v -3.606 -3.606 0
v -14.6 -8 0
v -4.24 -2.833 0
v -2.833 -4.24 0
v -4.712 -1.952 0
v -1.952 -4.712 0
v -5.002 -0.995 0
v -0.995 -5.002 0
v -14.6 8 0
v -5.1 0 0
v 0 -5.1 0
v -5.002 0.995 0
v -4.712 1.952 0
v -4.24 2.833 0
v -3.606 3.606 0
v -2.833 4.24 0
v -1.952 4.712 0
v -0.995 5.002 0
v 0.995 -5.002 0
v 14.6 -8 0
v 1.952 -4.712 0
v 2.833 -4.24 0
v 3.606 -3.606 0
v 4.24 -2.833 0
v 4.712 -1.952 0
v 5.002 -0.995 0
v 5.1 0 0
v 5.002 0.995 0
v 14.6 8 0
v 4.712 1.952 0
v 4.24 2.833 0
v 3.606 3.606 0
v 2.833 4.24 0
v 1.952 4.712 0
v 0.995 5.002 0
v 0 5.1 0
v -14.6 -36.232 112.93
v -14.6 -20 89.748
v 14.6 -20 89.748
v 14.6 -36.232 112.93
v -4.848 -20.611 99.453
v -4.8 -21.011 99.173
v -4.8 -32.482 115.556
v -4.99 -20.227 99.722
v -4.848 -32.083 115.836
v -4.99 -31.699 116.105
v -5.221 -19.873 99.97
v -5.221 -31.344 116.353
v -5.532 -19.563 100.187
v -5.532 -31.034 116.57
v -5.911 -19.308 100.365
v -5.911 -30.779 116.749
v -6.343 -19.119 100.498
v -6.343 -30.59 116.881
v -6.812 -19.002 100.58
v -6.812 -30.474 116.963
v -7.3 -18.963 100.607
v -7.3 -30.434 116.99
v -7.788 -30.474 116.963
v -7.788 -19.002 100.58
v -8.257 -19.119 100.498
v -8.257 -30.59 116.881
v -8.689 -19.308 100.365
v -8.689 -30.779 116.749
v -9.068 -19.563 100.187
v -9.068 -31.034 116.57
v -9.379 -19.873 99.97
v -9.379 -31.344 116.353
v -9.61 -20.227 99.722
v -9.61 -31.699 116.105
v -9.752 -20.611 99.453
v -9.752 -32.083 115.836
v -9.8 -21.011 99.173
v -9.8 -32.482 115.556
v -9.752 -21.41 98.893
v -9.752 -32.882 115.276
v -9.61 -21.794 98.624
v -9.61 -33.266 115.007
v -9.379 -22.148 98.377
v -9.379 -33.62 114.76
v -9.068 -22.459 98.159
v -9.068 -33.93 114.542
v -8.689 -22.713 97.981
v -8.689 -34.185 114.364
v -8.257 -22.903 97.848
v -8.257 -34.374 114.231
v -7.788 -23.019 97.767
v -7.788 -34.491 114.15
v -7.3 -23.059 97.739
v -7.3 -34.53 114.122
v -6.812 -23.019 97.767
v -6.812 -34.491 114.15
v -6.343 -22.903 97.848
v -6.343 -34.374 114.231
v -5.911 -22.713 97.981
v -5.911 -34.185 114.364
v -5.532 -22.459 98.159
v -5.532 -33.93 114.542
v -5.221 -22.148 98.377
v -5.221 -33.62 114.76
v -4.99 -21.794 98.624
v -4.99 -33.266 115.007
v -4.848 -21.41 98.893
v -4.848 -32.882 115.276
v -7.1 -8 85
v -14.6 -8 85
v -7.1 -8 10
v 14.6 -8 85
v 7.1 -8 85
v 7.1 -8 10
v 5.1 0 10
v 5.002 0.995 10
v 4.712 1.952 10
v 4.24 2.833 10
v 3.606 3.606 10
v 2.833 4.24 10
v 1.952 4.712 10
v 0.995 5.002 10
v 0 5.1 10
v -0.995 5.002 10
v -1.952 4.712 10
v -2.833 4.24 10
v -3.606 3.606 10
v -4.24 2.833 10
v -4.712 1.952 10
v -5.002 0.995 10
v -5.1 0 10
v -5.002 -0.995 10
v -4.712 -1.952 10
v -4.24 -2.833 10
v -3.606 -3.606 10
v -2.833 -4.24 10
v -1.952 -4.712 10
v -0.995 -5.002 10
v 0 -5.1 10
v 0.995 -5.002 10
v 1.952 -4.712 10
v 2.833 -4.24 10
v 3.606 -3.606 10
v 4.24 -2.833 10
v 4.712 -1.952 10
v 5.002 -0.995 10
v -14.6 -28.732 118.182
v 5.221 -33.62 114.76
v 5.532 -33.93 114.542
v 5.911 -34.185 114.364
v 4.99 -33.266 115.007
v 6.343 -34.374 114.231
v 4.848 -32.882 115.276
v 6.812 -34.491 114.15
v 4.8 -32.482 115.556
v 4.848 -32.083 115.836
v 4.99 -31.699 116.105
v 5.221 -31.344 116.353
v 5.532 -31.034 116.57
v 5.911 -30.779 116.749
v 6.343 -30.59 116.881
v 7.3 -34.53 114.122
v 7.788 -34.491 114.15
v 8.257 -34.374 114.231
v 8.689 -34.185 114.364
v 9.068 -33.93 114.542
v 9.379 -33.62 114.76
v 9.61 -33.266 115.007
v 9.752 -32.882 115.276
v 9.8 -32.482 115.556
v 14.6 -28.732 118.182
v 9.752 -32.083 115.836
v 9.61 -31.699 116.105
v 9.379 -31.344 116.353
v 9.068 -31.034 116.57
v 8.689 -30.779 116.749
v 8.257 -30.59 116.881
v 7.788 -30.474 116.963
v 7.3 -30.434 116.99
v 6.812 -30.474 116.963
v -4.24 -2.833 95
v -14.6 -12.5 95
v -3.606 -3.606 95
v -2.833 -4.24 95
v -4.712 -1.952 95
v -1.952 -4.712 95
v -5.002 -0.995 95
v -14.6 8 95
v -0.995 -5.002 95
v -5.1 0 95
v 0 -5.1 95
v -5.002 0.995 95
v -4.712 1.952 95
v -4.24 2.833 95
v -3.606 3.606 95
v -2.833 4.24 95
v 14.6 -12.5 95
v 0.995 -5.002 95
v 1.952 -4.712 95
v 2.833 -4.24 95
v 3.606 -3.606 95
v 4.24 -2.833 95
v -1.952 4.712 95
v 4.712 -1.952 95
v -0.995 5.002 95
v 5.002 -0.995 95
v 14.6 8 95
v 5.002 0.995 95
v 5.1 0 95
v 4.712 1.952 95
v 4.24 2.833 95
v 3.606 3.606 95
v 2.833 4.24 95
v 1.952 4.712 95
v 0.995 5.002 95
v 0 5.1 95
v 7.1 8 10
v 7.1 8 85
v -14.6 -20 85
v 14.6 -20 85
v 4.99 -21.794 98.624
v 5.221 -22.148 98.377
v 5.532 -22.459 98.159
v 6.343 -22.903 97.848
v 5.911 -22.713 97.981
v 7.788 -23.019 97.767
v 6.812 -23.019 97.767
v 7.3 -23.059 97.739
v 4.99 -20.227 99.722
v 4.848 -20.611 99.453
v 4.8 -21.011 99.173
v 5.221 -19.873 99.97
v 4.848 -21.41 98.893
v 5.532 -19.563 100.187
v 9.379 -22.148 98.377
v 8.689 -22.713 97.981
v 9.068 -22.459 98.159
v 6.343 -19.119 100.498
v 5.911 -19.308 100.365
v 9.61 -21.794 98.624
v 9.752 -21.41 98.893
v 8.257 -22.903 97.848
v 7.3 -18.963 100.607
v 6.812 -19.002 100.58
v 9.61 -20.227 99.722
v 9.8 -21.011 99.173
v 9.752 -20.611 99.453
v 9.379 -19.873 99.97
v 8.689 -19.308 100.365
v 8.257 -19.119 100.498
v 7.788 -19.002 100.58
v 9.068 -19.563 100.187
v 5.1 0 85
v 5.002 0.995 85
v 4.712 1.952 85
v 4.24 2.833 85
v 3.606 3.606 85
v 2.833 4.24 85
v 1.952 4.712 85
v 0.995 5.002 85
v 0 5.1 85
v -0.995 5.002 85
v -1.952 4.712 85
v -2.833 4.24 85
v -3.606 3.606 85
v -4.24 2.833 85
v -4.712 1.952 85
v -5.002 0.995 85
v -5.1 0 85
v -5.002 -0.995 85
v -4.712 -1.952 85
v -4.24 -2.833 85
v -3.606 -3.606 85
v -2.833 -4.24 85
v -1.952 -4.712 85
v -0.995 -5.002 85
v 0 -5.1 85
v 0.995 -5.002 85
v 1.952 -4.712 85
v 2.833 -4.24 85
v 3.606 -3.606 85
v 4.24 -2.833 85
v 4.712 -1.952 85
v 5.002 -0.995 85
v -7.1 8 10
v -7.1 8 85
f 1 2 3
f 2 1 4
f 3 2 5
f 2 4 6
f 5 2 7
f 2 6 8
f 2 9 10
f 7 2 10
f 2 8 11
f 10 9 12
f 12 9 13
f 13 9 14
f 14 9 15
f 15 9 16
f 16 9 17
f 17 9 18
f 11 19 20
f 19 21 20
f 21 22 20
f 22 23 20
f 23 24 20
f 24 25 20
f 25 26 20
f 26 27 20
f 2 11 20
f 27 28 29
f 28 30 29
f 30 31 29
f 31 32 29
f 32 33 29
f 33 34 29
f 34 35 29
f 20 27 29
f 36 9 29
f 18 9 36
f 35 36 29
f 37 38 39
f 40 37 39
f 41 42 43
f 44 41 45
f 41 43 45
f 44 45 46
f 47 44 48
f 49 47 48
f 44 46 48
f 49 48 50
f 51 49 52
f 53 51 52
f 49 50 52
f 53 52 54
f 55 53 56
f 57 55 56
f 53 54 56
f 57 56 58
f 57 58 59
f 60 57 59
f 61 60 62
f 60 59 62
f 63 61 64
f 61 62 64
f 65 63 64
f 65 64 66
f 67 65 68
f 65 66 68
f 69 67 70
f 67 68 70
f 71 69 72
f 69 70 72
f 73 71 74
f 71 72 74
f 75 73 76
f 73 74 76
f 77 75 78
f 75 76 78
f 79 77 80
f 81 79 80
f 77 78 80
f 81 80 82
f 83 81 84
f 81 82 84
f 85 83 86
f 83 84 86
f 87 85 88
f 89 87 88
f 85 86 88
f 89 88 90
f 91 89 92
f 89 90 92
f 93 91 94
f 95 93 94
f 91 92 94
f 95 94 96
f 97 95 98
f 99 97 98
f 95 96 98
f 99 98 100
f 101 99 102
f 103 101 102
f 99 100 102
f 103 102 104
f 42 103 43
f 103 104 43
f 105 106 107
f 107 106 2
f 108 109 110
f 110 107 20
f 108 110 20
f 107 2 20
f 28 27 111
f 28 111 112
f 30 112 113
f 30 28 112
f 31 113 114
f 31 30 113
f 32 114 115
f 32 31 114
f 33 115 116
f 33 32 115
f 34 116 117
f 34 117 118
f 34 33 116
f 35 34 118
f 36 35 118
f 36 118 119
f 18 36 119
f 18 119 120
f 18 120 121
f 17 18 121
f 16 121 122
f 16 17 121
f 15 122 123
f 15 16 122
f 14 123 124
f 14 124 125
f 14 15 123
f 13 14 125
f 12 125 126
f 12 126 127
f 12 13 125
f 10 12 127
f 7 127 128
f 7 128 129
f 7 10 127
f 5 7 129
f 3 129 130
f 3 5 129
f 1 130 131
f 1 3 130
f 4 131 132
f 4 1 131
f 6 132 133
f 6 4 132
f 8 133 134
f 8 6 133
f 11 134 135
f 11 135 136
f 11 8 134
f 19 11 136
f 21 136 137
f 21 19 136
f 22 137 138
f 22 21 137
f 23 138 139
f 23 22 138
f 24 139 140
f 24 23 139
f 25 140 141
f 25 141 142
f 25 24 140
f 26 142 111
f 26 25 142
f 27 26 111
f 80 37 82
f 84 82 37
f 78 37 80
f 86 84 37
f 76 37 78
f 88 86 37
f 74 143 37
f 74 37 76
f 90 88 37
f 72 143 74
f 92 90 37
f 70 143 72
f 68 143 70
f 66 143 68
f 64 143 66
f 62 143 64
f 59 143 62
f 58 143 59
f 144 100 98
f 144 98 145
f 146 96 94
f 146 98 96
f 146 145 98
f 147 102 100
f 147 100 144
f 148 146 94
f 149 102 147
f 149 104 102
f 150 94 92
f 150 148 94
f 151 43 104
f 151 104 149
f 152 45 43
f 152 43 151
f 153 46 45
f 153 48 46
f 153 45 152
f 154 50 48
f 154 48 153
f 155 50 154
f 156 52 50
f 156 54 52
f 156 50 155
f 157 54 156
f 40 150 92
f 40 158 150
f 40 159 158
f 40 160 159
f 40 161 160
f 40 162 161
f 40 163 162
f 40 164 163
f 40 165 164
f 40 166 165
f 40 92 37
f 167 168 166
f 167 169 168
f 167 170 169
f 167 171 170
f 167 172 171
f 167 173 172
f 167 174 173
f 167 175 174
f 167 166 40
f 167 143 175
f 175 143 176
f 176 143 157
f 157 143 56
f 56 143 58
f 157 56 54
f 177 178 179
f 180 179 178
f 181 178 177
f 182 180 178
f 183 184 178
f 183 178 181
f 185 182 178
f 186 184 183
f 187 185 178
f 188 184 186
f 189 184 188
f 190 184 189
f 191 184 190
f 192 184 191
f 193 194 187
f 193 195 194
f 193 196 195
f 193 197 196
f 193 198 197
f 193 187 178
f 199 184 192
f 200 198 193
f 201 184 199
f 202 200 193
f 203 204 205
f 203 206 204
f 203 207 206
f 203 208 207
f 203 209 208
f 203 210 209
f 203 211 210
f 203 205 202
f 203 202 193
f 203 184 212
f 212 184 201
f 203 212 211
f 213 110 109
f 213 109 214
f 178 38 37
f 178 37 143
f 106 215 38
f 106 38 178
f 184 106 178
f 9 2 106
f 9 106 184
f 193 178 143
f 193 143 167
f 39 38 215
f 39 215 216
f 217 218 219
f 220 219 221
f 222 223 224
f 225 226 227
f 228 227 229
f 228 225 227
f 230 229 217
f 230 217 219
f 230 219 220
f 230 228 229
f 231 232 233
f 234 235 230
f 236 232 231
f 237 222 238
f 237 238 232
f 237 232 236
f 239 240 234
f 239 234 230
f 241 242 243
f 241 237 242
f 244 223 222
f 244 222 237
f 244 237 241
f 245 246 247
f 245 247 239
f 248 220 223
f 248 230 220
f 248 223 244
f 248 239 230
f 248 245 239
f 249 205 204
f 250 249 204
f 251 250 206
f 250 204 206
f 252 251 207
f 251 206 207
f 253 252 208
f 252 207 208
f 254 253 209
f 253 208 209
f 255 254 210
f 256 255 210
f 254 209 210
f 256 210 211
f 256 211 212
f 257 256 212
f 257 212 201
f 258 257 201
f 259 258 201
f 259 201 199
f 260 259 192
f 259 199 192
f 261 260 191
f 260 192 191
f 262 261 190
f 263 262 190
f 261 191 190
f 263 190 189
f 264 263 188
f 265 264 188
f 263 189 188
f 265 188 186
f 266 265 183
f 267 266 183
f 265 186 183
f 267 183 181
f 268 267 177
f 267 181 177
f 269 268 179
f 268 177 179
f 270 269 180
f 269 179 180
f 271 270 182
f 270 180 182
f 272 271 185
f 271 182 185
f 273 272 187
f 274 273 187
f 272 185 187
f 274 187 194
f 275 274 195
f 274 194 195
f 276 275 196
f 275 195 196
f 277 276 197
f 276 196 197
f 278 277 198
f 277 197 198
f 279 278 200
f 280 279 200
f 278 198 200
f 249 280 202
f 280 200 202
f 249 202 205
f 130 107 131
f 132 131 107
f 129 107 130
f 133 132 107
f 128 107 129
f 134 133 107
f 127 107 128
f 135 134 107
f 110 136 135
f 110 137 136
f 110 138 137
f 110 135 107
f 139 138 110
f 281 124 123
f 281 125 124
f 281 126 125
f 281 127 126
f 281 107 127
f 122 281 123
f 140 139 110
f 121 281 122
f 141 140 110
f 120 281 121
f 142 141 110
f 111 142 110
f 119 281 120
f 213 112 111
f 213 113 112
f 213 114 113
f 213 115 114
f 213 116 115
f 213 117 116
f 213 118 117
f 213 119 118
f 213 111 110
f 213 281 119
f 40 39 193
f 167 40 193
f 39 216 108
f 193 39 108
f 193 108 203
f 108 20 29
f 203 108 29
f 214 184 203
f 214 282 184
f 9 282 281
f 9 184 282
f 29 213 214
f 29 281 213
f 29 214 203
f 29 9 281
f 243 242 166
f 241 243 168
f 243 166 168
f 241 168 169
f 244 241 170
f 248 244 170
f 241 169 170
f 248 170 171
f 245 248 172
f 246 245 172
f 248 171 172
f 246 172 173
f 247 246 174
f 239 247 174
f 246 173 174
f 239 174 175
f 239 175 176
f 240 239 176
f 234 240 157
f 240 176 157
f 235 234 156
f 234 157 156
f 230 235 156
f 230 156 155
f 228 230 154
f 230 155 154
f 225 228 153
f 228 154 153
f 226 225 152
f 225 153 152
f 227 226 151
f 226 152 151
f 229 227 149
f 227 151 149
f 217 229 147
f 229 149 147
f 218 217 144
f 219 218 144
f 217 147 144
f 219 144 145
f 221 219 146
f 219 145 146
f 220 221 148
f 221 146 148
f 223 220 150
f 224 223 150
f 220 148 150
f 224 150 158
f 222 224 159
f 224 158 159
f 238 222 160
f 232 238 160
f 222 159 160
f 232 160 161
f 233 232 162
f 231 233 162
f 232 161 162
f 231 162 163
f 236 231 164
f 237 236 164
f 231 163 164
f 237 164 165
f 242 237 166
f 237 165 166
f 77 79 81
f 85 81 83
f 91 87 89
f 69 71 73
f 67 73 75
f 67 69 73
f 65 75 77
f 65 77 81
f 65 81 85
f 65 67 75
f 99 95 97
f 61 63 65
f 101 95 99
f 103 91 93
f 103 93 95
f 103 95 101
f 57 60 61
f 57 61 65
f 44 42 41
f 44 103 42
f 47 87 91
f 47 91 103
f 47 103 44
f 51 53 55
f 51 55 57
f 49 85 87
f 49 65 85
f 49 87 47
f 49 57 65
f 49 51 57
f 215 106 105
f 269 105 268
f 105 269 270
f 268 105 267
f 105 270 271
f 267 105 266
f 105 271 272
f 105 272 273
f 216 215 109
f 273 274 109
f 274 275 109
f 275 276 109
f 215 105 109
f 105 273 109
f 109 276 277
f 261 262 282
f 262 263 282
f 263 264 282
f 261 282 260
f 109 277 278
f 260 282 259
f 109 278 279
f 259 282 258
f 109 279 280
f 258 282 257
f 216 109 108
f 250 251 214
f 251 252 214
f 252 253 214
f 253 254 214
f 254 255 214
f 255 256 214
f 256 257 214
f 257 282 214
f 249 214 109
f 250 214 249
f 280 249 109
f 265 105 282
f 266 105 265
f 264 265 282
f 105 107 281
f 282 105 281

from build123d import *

# Parameters (mm, degrees)
SKETCH1_R           = 5.1
BOSS_EXTRUDE1_DEPTH = 10
SKETCH2_W           = 7.5
SKETCH2_H           = 16
BOSS_EXTRUDE2_DEPTH = 85
SKETCH3_W           = 29.2
SKETCH3_H           = 16
SKETCH3_R           = 5.1
BOSS_EXTRUDE3_DEPTH = 10
SKETCH4_W           = 29.2
SKETCH4_H           = 12
BOSS_EXTRUDE4_DEPTH = 10
CUT_EXTRUDE1_REACH  = 31.2
SKETCH6_W           = 29.2
SKETCH6_H           = 9.155809416
BOSS_EXTRUDE5_DEPTH = 28.3
SKETCH7_R           = 2.5
CUT_EXTRUDE2_DEPTH  = 20


with BuildPart() as part:
    # Sketch1 → Boss-Extrude1 (new body)
    with BuildSketch(Plane.XY):
        Polygon((-7.1, 8), (-14.6, 8), (-14.6, -8), (-7.1, -8), (7.1, -8), (14.6, -8), (14.6, 8), (7.1, 8), align=None)
        Circle(SKETCH1_R, mode=Mode.SUBTRACT)
    extrude(amount=BOSS_EXTRUDE1_DEPTH)

    # Sketch2 → Boss-Extrude2 (add)
    with BuildSketch(Plane.XY.offset(10)):
        with Locations((-10.85, 0)):
            Rectangle(SKETCH2_W, SKETCH2_H)
        with Locations((10.85, 0)):
            Rectangle(SKETCH2_W, SKETCH2_H)
    extrude(amount=BOSS_EXTRUDE2_DEPTH)

    # Sketch3 → Boss-Extrude3 (add)
    with BuildSketch(Plane.XY.offset(95)):
        Rectangle(SKETCH3_W, SKETCH3_H)
        Circle(SKETCH3_R, mode=Mode.SUBTRACT)
    extrude(amount=-BOSS_EXTRUDE3_DEPTH)

    # Sketch4 → Boss-Extrude4 (add)
    with BuildSketch(Plane.XY.offset(95)):
        with Locations((0, -14)):
            Rectangle(SKETCH4_W, SKETCH4_H)
    extrude(amount=-BOSS_EXTRUDE4_DEPTH)

    # Sketch5 → Cut-Extrude1 (cut, up to next)
    with BuildSketch(Plane(origin=(14.6, 0, 0), x_dir=(0, 0, -1), z_dir=(1, 0, 0)), mode=Mode.PRIVATE) as cut_extrude1_sk1:
        Polygon((-95, -12.5), (-89.748443463, -20), (-95, -20), align=None)
    cut_extrude1_tool1 = extrude(cut_extrude1_sk1.sketch, amount=-CUT_EXTRUDE1_REACH, mode=Mode.PRIVATE) & part.part
    add(cut_extrude1_tool1.solids().sort_by_distance((14.6, -17.5, 93.249481))[0], mode=Mode.SUBTRACT)

    # Sketch6 → Boss-Extrude5 (add)
    with BuildSketch(Plane(origin=(0, -48.747773592, 69.619035688), x_dir=(1, 0, 0), z_dir=(0, -0.573576436, 0.819152044))):
        with Locations((0, 39.672456192)):
            Rectangle(SKETCH6_W, SKETCH6_H)
    extrude(amount=BOSS_EXTRUDE5_DEPTH)

    # Sketch7 → Cut-Extrude2 (cut)
    with BuildSketch(Plane(origin=(0, -64.97998674, 92.801038541), x_dir=(1, 0, 0), z_dir=(0, -0.573576436, 0.819152044))):
        with Locations((-7.3, 39.672456192)):
            Circle(SKETCH7_R)
        with Locations((7.3, 39.672456192)):
            Circle(SKETCH7_R)
    extrude(amount=-CUT_EXTRUDE2_DEPTH, mode=Mode.SUBTRACT)


solid = part.part
